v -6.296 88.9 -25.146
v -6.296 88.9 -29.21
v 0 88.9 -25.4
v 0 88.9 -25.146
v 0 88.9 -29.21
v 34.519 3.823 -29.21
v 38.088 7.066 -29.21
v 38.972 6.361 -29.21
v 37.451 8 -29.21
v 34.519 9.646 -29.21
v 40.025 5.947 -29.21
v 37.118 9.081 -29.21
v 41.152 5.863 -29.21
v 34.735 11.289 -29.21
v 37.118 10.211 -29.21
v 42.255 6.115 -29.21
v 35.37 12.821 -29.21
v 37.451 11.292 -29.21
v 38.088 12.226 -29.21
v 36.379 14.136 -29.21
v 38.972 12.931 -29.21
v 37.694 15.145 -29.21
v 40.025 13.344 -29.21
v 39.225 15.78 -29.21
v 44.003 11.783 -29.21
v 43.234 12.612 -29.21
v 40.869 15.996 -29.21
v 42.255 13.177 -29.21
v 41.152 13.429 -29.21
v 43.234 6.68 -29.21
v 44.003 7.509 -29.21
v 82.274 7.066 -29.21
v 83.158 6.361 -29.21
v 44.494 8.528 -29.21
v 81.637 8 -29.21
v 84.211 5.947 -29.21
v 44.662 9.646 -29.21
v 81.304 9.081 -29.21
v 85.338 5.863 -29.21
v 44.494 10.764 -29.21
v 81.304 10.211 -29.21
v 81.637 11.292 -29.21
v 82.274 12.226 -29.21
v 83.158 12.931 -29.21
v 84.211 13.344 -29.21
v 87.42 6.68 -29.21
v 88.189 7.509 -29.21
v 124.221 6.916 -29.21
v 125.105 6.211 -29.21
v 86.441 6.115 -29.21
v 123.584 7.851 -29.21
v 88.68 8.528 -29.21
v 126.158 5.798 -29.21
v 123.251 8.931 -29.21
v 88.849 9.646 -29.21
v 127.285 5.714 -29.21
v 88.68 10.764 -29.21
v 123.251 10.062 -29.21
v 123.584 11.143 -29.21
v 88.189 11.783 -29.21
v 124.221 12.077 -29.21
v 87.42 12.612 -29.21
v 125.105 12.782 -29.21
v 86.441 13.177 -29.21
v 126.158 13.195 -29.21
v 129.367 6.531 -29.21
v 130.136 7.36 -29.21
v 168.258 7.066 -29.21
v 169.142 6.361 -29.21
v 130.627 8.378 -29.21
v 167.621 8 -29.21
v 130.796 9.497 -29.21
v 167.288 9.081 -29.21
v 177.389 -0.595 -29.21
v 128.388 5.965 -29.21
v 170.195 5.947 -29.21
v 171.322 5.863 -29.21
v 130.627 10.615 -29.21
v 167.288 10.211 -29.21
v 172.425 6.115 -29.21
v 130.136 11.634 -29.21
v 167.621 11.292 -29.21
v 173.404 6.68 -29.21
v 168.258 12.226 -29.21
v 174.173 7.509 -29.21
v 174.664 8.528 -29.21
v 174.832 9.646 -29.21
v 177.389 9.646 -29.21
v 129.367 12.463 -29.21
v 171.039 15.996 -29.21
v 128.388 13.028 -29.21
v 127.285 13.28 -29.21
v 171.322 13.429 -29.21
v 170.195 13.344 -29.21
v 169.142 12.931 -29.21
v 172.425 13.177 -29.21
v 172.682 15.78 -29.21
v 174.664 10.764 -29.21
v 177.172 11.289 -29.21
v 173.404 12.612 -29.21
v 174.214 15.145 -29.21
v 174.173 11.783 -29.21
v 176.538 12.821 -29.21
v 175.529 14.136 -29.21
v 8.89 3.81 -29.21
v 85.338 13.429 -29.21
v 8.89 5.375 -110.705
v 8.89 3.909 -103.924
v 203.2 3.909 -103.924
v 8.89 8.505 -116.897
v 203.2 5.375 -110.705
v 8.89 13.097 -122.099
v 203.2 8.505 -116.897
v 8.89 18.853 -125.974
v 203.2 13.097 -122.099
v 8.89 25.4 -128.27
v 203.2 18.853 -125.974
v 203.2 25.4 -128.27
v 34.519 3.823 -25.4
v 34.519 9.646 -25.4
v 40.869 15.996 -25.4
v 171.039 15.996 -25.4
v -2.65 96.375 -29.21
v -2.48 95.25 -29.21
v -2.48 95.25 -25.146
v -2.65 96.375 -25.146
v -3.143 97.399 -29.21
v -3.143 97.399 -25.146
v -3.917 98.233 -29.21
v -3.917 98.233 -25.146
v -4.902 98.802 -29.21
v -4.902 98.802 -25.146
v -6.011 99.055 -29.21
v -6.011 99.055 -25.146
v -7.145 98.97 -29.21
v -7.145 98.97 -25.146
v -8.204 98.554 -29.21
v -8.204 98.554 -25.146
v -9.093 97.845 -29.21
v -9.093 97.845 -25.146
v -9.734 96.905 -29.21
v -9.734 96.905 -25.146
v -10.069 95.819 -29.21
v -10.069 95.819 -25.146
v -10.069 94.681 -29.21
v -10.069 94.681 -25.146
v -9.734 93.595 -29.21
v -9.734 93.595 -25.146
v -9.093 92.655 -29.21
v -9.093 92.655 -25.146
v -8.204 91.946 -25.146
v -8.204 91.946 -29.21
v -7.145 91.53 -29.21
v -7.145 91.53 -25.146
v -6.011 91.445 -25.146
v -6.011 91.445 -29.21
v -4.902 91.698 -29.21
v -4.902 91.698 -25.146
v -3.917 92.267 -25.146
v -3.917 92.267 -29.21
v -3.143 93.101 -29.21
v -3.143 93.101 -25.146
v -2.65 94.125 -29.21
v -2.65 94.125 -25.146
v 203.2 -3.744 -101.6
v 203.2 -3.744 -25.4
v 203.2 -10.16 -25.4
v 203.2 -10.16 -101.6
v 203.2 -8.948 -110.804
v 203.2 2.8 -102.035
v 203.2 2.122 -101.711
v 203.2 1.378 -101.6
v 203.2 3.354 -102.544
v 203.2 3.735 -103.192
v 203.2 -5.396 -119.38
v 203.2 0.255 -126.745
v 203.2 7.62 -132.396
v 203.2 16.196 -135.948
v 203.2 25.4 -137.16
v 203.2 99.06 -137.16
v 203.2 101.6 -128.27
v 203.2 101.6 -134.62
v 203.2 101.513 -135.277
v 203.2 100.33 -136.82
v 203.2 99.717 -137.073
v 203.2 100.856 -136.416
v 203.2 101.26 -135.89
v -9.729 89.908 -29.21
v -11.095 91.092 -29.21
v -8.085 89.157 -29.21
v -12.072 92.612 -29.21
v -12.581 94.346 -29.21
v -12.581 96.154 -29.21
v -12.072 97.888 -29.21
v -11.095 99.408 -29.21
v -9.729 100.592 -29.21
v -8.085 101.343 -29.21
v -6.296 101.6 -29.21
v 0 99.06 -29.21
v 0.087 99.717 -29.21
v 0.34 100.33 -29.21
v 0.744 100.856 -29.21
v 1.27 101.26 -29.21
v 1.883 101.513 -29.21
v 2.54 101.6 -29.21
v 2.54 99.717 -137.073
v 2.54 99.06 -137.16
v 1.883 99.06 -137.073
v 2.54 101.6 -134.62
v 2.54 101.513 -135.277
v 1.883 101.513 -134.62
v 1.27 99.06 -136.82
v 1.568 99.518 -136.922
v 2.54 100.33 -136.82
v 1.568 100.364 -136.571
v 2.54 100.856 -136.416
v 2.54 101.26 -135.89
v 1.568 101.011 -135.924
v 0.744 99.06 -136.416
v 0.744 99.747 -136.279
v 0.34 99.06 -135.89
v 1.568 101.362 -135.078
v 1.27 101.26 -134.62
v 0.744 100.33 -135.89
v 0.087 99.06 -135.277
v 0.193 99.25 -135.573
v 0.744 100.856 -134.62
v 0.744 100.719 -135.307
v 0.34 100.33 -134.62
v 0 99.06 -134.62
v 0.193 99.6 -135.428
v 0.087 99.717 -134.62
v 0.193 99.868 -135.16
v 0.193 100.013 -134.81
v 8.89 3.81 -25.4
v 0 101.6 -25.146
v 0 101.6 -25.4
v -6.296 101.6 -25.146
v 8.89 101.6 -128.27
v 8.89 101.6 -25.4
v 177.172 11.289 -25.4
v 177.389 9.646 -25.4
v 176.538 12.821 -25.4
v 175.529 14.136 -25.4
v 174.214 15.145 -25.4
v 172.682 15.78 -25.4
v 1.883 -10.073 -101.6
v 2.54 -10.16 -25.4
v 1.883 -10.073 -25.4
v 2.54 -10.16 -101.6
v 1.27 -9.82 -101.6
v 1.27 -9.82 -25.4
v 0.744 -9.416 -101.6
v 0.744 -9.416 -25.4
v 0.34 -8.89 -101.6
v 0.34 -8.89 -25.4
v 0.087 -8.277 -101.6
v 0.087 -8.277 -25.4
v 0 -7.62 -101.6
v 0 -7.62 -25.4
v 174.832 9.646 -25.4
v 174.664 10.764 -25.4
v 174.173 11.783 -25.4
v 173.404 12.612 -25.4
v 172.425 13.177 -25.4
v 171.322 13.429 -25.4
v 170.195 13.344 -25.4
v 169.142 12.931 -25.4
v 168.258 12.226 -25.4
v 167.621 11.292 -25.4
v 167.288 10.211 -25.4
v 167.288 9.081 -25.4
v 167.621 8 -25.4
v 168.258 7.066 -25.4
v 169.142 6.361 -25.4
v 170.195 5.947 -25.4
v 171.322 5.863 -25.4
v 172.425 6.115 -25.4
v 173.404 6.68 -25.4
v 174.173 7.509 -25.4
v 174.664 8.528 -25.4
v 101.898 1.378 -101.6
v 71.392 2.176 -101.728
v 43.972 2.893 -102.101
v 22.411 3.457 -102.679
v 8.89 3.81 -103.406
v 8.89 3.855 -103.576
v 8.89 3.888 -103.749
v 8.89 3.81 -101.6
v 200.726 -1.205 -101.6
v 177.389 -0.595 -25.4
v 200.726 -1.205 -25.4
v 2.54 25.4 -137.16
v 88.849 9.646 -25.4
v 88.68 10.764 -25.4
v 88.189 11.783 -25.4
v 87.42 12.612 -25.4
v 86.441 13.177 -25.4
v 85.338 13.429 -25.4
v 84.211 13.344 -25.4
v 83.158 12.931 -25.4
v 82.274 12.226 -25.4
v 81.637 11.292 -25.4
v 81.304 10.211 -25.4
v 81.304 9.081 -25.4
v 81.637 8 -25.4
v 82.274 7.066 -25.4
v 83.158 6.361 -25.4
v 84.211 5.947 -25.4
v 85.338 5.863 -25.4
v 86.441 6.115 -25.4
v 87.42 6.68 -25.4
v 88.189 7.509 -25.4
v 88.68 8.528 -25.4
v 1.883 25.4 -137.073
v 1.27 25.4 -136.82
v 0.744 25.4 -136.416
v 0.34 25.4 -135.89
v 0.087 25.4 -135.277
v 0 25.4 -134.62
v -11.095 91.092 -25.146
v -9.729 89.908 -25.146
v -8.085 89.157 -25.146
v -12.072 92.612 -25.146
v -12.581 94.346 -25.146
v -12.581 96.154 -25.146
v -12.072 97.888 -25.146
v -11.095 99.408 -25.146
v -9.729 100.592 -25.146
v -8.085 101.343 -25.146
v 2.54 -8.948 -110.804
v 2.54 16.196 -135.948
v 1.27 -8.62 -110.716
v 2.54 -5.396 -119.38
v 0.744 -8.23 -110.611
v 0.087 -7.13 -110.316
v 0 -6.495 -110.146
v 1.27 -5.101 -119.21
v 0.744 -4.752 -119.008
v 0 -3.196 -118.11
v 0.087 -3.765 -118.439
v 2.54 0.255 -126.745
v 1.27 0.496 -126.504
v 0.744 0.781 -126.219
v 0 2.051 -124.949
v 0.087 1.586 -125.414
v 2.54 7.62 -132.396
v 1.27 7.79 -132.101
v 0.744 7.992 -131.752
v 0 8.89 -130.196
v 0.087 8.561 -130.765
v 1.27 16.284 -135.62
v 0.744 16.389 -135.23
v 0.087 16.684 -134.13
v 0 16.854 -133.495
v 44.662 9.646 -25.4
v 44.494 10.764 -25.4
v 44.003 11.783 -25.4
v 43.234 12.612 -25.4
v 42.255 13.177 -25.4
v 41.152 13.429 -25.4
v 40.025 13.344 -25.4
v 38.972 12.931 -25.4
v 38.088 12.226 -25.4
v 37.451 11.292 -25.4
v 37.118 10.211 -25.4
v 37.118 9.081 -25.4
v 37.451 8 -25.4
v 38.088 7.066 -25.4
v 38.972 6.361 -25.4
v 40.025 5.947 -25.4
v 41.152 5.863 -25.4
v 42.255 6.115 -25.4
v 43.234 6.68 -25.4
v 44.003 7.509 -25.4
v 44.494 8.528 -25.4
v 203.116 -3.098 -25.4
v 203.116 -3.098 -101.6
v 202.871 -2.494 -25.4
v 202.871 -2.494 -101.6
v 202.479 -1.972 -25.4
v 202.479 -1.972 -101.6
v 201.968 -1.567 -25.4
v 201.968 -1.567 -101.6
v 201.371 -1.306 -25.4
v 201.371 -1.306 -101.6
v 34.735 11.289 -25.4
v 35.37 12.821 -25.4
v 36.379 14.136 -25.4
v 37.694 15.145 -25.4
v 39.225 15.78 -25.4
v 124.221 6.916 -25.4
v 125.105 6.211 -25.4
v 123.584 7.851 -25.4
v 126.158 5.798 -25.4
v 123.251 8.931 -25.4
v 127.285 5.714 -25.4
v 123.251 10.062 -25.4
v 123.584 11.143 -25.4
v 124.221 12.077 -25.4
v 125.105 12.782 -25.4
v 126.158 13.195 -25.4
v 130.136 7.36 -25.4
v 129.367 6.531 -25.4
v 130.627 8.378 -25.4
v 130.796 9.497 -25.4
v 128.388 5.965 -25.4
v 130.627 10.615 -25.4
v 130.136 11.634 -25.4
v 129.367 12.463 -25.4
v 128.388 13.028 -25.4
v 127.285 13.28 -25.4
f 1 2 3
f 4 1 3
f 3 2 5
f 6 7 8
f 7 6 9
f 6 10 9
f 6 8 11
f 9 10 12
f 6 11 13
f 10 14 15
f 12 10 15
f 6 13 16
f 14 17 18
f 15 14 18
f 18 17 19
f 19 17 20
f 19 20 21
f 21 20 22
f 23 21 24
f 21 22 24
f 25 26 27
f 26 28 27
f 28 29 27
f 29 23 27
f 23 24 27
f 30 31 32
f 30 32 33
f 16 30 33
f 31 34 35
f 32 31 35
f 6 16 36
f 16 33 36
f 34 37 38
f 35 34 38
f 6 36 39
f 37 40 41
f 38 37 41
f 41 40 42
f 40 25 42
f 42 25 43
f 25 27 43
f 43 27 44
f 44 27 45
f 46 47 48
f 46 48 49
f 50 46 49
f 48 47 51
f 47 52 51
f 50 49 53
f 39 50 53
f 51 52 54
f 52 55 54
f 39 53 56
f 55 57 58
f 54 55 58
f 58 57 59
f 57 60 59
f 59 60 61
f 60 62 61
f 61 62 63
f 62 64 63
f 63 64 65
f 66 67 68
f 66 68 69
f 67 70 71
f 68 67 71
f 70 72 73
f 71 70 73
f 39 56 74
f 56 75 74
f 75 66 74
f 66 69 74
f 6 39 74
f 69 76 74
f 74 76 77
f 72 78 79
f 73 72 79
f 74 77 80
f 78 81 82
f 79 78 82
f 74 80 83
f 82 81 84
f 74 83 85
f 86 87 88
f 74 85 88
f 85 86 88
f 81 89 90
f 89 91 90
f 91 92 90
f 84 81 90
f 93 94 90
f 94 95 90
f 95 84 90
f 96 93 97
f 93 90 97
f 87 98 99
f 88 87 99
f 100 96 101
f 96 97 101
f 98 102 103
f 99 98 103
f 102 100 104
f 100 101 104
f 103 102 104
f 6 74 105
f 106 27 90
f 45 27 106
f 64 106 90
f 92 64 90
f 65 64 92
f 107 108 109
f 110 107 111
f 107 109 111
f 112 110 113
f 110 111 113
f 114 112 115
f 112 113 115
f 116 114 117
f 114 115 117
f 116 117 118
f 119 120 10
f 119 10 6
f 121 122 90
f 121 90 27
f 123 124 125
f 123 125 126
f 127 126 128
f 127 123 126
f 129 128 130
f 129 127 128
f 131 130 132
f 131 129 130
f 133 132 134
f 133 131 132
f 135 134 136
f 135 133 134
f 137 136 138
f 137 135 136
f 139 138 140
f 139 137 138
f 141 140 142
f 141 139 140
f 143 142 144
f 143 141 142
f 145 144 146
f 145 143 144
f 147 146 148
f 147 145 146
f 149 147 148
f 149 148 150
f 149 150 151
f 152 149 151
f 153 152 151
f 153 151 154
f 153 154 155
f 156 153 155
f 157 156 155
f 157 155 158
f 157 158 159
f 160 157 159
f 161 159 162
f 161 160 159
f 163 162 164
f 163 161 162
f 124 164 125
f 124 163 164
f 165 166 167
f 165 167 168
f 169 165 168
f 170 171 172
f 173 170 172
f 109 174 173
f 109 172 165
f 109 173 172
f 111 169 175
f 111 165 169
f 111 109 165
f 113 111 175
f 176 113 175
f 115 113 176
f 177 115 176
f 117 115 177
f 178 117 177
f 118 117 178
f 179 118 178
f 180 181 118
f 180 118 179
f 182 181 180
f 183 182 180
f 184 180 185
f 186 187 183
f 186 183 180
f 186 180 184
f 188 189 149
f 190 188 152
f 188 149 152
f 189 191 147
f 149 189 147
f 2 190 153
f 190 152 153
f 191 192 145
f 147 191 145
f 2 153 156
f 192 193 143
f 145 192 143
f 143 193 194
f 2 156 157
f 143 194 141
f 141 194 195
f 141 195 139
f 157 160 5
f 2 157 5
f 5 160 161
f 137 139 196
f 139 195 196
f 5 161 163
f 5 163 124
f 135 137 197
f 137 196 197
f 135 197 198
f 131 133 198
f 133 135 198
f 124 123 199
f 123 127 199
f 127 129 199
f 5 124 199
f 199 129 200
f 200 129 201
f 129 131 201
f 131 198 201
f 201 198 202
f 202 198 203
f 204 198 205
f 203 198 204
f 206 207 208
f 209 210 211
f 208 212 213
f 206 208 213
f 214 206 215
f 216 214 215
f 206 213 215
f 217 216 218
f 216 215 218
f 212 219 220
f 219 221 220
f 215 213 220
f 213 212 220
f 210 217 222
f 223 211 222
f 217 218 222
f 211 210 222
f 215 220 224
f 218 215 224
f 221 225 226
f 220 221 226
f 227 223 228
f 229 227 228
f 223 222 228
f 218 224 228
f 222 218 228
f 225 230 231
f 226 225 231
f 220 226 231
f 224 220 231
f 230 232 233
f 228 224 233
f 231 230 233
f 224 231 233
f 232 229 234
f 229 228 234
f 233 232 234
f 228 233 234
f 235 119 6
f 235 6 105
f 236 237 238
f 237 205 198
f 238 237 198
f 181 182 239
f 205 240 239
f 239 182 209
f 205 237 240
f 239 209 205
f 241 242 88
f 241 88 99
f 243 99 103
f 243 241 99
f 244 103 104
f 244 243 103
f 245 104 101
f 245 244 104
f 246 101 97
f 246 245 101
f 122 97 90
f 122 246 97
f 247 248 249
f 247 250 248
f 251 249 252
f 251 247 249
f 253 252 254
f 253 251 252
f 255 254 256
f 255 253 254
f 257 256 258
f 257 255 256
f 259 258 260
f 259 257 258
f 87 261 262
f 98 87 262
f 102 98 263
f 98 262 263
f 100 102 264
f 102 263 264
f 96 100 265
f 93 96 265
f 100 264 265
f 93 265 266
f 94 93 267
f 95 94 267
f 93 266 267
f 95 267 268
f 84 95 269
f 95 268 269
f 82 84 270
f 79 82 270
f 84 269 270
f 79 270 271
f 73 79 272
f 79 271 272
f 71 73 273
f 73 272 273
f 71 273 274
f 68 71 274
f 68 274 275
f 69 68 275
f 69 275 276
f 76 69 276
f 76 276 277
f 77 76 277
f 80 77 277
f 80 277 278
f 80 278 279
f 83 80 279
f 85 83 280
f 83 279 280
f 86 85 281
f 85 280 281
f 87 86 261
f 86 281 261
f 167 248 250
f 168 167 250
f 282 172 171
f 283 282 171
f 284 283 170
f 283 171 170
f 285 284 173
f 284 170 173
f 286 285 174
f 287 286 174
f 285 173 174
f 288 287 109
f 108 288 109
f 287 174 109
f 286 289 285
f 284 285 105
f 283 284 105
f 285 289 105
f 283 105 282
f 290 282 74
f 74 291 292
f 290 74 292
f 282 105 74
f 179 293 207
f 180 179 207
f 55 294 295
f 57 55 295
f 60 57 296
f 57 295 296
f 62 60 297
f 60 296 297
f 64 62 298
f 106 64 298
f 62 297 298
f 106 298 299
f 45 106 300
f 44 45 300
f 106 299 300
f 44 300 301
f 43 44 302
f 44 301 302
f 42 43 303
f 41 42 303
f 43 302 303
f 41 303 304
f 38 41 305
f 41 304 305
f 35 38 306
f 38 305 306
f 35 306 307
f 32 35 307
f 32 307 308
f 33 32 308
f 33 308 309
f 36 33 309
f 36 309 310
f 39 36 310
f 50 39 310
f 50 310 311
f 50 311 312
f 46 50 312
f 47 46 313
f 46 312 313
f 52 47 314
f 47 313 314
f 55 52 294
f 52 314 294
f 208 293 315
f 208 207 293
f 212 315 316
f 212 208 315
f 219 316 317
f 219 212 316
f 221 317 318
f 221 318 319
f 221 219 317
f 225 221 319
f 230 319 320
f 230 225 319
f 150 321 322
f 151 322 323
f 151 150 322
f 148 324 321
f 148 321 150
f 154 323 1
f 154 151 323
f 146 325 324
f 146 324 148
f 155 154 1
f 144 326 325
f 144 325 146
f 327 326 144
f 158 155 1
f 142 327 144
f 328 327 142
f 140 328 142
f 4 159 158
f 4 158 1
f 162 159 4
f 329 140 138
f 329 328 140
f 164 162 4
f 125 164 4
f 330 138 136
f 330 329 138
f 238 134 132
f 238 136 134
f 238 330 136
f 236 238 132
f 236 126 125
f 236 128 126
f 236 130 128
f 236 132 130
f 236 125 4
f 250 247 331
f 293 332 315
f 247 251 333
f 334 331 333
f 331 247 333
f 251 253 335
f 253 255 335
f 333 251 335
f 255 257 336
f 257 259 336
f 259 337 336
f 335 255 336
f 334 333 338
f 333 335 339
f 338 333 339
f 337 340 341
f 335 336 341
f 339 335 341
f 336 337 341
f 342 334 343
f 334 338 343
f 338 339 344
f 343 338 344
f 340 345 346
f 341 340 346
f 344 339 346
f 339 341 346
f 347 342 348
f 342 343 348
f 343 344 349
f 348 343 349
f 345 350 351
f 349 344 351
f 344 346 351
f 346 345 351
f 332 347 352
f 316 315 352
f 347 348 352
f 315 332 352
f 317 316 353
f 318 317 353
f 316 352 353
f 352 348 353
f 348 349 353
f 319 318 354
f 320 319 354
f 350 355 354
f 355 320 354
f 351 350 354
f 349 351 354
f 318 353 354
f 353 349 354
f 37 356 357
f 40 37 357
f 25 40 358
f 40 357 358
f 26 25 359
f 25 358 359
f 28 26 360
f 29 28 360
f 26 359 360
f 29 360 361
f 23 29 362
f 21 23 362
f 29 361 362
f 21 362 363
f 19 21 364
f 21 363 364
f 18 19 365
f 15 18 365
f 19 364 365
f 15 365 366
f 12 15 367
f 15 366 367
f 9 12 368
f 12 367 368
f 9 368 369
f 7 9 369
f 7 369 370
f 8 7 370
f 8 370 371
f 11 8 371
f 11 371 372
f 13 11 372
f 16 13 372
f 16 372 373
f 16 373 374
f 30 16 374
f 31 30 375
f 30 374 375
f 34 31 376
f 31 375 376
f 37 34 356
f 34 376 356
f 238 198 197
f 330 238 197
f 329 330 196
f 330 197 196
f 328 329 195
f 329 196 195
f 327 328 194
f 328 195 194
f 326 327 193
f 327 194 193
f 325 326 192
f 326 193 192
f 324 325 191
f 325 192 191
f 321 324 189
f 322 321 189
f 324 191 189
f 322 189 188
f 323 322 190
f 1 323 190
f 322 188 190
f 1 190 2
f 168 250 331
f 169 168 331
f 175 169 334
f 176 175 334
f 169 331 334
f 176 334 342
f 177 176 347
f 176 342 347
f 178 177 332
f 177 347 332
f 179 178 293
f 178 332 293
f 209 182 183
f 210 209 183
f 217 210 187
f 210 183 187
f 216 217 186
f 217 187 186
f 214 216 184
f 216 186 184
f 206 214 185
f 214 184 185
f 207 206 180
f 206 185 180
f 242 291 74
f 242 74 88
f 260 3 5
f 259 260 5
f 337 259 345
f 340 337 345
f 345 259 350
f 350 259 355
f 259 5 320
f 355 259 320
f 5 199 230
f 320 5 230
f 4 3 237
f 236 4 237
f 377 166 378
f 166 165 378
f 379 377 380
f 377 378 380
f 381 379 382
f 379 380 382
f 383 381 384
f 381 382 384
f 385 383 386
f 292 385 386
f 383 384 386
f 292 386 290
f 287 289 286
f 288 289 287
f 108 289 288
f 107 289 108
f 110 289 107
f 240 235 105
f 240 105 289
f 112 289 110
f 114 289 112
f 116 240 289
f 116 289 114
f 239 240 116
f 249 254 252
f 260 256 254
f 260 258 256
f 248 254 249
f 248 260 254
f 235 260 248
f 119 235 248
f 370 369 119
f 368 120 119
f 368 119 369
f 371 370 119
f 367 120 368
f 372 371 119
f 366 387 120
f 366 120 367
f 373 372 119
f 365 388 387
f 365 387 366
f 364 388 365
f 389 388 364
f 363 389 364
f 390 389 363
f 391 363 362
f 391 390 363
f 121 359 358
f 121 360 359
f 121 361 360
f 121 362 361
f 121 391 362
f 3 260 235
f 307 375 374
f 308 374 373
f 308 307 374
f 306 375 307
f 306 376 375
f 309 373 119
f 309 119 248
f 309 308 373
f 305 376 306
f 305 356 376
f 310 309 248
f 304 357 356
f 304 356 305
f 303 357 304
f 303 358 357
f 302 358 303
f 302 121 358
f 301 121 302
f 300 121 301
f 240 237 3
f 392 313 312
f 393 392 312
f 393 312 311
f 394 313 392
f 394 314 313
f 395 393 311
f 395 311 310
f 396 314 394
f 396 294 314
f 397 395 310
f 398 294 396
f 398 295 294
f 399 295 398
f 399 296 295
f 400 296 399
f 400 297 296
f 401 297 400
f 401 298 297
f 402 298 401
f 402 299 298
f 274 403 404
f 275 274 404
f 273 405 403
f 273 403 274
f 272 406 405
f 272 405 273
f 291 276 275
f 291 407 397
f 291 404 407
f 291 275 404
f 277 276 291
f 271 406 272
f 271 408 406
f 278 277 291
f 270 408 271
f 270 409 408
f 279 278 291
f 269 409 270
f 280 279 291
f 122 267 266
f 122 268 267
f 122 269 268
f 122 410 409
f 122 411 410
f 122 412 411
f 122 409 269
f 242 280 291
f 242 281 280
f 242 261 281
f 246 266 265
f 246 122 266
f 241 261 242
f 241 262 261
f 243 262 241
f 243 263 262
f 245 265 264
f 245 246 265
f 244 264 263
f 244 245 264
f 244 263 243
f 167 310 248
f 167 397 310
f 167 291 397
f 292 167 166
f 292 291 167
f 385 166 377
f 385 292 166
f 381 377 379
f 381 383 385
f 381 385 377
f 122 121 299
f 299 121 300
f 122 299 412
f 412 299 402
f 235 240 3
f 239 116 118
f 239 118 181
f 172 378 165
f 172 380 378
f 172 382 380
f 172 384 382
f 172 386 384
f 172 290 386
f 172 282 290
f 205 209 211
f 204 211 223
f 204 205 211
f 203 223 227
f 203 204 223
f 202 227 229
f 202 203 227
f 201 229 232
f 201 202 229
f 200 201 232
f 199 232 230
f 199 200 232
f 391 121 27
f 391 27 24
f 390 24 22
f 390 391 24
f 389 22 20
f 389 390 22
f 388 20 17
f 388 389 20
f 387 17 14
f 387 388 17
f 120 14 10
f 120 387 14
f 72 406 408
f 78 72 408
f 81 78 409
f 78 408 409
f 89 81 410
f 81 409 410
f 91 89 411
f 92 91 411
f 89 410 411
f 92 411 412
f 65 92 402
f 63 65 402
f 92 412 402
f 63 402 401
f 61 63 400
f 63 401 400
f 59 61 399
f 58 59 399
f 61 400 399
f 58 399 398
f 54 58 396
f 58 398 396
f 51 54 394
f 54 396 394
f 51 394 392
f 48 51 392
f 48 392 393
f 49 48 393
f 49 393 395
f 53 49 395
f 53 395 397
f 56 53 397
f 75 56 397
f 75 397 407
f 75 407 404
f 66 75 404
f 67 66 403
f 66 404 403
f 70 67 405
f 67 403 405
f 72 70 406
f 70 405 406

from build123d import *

# Parameters (mm, degrees)
BOSS_EXTRUDE1_DEPTH      = 203.2
CUT_EXTRUDE1_DEPTH       = 194.31
CUT_EXTRUDE2_DEPTH       = 76.2
FILLET1_R                = 2.54
SKETCH8_R                = 3.793541353
BOSS_EXTRUDE2_DEPTH      = 3.81
BOSS_EXTRUDE3_DEPTH      = 0.254
BOSS_EXTRUDE3_DEPTH_BACK = 3.81
SKETCH9_R                = 3.815492591
FILLET2_R                = 2.54
FILLET4_R                = 2.54
FILLET5_R                = 2.54


with BuildPart() as part:
    # Sketch1 → Boss-Extrude1 (new body)
    with BuildSketch(Plane(origin=(0, 0, 0), x_dir=(0, 0, -1), z_dir=(1, 0, 0))):
        with BuildLine():
            Line((25.4, 0), (25.4, -10.16))
            Line((25.4, -10.16), (101.6, -10.16))
            ThreePointArc((101.6, -10.16), (126.744717139, 0.255282861), (137.16, 25.4))
            Line((137.16, 25.4), (137.16, 101.6))
            Line((137.16, 101.6), (127, 101.6))
            Line((127, 101.6), (25.4, 101.6))
            Line((25.4, 101.6), (25.4, 0))
        make_face()
    extrude(amount=BOSS_EXTRUDE1_DEPTH)

    # Sketch4 → Cut-Extrude1 (cut)
    with BuildSketch(Plane(origin=(203.2, 0, 0), x_dir=(0, 0, -1), z_dir=(1, 0, 0))):
        with BuildLine():
            Line((25.4, 3.81), (101.6, 3.81))
            ThreePointArc((101.6, 3.81), (118.756755229, 9.884008246), (128.27, 25.4))
            Line((128.27, 25.4), (128.27, 101.6))
            Line((128.27, 101.6), (25.4, 101.6))
            Line((25.4, 101.6), (25.4, 3.81))
        make_face()
    extrude(amount=-CUT_EXTRUDE1_DEPTH, mode=Mode.SUBTRACT)

    # Sketch5 → Cut-Extrude2 (cut)
    with BuildSketch(Plane.XY.offset(-25.4)):
        Polygon((203.2, 3.81), (8.89, 3.81), (203.2, -1.27), align=None)
    extrude(amount=-CUT_EXTRUDE2_DEPTH, mode=Mode.SUBTRACT)

    # Fillet1
    # the kernel refuses this fillet: 2.54 mm, written as the material it takes off along each edge
    with BuildSketch(Plane(origin=(209.278955694, 3.81, -101.6), x_dir=(0, -1, 0), z_dir=(-1, 0, 0))) as fillet1_piece_1_section:
        with BuildLine():
            CenterArc((2.431582278, -2.54), FILLET1_R, 90, 85.111724817)
            ThreePointArc((-0.099179119, -2.323558897), (-0.024806063, -1.162837311), (0, 0))
            Line((0, 0), (2.431582278, 0))
        make_face()
    fillet1_piece_1 = extrude(amount=200.388955694, mode=Mode.PRIVATE)
    fillet1_piece_1 = split(fillet1_piece_1, bisect_by=Plane(origin=(118.388821379, 0.947285716, -102.156943798), z_dir=(0.02613486081539205, 0.9996584261887458, 0)), keep=Keep.TOP, mode=Mode.PRIVATE)
    add(fillet1_piece_1, mode=Mode.SUBTRACT)

    # Sketch8 → Boss-Extrude2 (add)
    with BuildSketch(Plane.XY.offset(-25.4)):
        with BuildLine():
            Line((34.518861263, 3.823081405), (8.89, 3.81))
            Line((8.89, 3.81), (177.388856757, -0.595198869))
            Line((177.388856757, -0.595198869), (177.388856757, 9.645912611))
            ThreePointArc((177.388856757, 9.645912611), (175.528984934, 14.136040391), (171.038857154, 15.995912214))
            Line((171.038857154, 15.995912214), (40.868860866, 15.995912214))
            ThreePointArc((40.868860866, 15.995912214), (36.378733086, 14.136040391), (34.518861263, 9.645912611))
            Line((34.518861263, 9.645912611), (34.518861263, 3.823081405))
        make_face()
        with Locations((127.001989144, 9.496635092)):
            Circle(SKETCH8_R, mode=Mode.SUBTRACT)
        with Locations((171.038857154, 9.645912611)):
            Circle(SKETCH8_R, mode=Mode.SUBTRACT)
        with Locations((40.868860866, 9.645912611)):
            Circle(SKETCH8_R, mode=Mode.SUBTRACT)
        with Locations((85.055006395, 9.645912611)):
            Circle(SKETCH8_R, mode=Mode.SUBTRACT)
    extrude(amount=-BOSS_EXTRUDE2_DEPTH)

    # Sketch9 → Boss-Extrude3 (add, two sides: drawn at the far end of the back side and taken through both)
    with BuildSketch(Plane.XY.offset(-25.4).offset(-BOSS_EXTRUDE3_DEPTH_BACK)):
        with BuildLine():
            Line((0, 96.077095974), (0, 101.6))
            Line((0, 101.6), (-6.295904403, 101.6))
            ThreePointArc((-6.295904403, 101.6), (-12.645904403, 95.25), (-6.295904403, 88.9))
            Line((-6.295904403, 88.9), (0, 88.9))
            Line((0, 88.9), (0, 94.422904026))
            Line((0, 94.422904026), (0, 96.077095974))
        make_face()
        with Locations((-6.295904403, 95.25)):
            Circle(SKETCH9_R, mode=Mode.SUBTRACT)
    extrude(amount=BOSS_EXTRUDE3_DEPTH + BOSS_EXTRUDE3_DEPTH_BACK)

    # Fillet2
    fillet2_edges = [part.edges().sort_by_distance(p)[0] for p in [
        (101.6, 101.6, -137.16),
    ]]
    fillet(fillet2_edges, radius=FILLET2_R)

    # Fillet4
    fillet4_edges = [part.edges().sort_by_distance(p)[0] for p in [
        (203.2, -1.27, -63.5),
    ]]
    fillet(fillet4_edges, radius=FILLET4_R)

    # Fillet5
    fillet5_edges = [part.edges().sort_by_distance(p)[0] for p in [
        (0, 101.6, -81.915),
        (0, 100.856051224, -136.416051224),
        (0, 62.23, -137.16),
        (0, 0.255282861, -126.744717139),
        (0, -10.16, -63.5),
    ]]
    fillet(fillet5_edges, radius=FILLET5_R)


solid = part.part
